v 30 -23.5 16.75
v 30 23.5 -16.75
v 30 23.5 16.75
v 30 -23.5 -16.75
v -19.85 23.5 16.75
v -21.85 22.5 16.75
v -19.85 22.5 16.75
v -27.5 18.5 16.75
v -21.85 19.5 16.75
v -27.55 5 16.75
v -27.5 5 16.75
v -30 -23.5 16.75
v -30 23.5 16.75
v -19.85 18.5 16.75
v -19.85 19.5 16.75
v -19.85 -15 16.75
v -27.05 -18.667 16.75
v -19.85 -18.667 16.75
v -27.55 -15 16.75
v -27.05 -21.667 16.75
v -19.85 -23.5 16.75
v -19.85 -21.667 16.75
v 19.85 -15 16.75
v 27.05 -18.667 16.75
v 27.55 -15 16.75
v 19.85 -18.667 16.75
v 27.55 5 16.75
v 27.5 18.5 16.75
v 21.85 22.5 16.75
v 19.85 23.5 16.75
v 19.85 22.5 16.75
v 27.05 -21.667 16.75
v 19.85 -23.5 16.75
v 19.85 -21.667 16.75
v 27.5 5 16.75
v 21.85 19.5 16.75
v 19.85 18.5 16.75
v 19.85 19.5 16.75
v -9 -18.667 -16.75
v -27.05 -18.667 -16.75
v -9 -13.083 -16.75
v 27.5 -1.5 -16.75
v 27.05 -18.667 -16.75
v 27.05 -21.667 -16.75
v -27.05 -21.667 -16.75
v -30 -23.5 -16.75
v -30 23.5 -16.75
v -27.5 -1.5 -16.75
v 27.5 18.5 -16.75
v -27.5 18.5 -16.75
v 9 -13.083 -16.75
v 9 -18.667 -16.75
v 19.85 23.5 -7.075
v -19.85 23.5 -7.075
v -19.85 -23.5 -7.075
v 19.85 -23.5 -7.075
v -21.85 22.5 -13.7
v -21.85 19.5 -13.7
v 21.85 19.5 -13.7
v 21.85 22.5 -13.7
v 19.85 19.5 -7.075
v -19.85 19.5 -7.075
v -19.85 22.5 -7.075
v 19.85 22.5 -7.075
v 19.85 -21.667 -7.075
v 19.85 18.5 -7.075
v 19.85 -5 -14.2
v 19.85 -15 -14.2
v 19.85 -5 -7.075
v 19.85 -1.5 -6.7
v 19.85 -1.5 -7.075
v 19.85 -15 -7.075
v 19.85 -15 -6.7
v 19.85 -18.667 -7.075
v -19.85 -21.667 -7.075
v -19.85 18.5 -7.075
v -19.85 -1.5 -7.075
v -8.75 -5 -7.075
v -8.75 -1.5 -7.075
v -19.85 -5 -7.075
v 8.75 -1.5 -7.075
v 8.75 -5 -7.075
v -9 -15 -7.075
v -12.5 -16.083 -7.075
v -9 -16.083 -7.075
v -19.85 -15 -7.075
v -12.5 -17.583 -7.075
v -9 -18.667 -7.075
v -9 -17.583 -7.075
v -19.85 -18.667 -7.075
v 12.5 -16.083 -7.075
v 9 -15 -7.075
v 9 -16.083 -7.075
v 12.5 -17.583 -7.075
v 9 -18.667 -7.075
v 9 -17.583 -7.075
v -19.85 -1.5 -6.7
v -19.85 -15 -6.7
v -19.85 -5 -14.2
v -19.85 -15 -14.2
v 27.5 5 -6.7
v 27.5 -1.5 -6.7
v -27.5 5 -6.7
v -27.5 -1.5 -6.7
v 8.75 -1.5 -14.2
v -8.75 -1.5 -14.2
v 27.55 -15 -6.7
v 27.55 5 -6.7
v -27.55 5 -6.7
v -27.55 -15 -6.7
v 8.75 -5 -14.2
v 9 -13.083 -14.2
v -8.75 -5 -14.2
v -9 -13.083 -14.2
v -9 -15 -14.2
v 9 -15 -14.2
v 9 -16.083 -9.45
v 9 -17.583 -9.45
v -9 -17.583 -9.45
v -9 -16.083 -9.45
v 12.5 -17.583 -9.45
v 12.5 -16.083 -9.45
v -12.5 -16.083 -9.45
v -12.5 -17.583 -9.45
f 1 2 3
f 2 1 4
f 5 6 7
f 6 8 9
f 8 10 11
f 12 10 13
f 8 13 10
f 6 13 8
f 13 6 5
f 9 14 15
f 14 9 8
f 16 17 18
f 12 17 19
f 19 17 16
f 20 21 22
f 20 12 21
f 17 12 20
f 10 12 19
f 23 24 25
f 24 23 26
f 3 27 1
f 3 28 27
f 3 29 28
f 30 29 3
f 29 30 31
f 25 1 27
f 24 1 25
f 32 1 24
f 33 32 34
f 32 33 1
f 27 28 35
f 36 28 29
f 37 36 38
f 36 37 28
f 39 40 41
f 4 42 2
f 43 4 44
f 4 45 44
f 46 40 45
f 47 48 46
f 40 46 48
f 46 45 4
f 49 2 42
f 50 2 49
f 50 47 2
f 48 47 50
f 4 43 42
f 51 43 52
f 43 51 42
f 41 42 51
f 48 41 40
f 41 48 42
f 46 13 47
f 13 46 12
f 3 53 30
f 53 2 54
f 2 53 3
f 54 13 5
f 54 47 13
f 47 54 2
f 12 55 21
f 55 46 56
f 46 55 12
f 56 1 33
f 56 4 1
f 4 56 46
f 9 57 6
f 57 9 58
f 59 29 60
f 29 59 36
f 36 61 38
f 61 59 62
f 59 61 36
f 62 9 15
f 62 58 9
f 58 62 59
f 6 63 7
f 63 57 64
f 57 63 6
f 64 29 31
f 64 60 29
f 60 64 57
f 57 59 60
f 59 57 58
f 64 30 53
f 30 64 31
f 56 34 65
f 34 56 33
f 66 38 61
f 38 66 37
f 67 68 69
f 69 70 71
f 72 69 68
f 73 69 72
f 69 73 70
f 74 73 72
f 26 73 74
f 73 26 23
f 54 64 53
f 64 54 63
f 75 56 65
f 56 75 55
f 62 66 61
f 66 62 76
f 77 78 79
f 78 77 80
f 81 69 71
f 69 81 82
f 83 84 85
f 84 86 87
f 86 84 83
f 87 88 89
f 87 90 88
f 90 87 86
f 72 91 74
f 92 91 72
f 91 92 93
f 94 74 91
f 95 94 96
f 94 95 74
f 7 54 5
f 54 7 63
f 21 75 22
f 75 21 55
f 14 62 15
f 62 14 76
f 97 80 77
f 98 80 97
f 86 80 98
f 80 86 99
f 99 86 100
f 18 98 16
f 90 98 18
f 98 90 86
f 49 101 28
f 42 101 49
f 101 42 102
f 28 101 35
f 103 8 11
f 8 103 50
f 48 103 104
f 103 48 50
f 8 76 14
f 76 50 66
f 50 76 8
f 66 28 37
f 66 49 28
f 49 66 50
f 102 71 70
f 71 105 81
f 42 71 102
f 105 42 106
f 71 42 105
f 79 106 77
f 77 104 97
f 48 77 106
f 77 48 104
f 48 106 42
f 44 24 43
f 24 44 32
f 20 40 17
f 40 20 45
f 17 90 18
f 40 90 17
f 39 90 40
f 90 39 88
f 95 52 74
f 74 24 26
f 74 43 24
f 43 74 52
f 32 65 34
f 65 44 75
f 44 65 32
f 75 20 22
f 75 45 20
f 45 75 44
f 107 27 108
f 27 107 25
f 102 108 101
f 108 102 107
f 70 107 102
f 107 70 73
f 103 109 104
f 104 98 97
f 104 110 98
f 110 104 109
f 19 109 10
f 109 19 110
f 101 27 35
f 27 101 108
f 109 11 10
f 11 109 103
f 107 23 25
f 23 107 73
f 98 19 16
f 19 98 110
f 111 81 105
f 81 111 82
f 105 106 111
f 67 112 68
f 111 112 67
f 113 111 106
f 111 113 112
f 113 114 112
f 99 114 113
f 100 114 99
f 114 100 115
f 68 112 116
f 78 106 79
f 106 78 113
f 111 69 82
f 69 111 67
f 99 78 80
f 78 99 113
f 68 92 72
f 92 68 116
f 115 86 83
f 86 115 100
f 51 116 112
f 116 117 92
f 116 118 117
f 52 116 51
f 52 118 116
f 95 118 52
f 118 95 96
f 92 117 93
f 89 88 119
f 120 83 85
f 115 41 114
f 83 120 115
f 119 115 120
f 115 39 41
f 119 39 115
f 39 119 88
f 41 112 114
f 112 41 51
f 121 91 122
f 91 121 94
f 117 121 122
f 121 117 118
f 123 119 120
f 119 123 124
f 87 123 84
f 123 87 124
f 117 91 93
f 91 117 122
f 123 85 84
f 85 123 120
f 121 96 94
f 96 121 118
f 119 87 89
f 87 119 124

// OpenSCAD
/*
    Fernán Federici 2017 (CC BY 4.0; https://creativecommons.org/licenses/by/4.0/) 
 
    With this code you can make a camera adapter for RPI camera from waveshare (http://www.waveshare.com/product/mini-pc/raspberry-pi/cameras/rpi-camera-b.htm) and for V2 RPI camera (https://www.raspberrypi.org/products/camera-module-v2/)
 
*/

/////This code needs a lot of clean up and reorganization but it works//////////edits would be very welcome :) ////////////
 
x=60;//frontal width
y=47;//height 33+9+5
z=33.5; // depth
filter_x=43.7;
filter_y=31.4;
filter_z=3;
bed_x=54;
bed_y=3;
bed_z=100;
arm=5;
focus_space=20; // enough distance for lens focus adjustment
holder_x=54;//acrylic bed width to fit into holder
holder_y=3;//acrylic bed thickness to fit into holder, normally 3mm acrylic
$fn=100;
fudge=0.1; // to fix error in rendering leaving thin wall...help me!
int_gap=17.5; 
camera_type=0; //0 for waveshare camera (32x32mm); 1 for V2 RPI camera (25x24x9)
china_spacex= 24.3;
V2_spacex= 18;
waveshare_cam_x=32.2;
waveshare_cam_y=1.5; //thickness
waveshare_cam_z=32.2;
RPIV2_cam_x=25;
RPIV2_cam_y=1.5; //thickness
RPIV2_cam_z=24;


module cam_holder_base() {
    difference(){
    cube([x,y,z], center=true);
           translate([0,(y/2)-arm/2,2]) rotate([90,0,0])  cube([filter_x,filter_y,filter_z], center=true);
           translate([0,0,8])  color("blue") cube([filter_x-4,y+fudge,z*0.9], center=true);
           translate([0,(y/2)-(focus_space/2+arm),0])  color("Red")  cube([(x-arm),focus_space,z+fudge], center=true);
           translate([0,-((y/2)-arm/1.5),0]) color ("pink") cube([holder_x+fudge,holder_y,z+fudge], center=true);
           translate([0,-arm,arm+fudge]) color ("purple")  cube([(x-arm)+fudge,focus_space,(z-arm*2)+fudge], center=true);
           translate([0,-arm*1.5,-arm/2+fudge]) color ("yellow")  cube([int_gap,y/2,(z-arm*2)+fudge], center=true);
           translate([0,-arm*2,-arm/2+fudge]) color ("black")  cube([filter_x-4,arm*2,(z-arm*2)+fudge], center=true);
    }
}
       
module waveshare_cam() {
           translate([0,-((y/2)-arm/.75),0]) color ("red")  cube([china_spacex,arm*1.5,z+fudge], center=true);
           translate([0,-((y/2)-arm/.75),arm/2+fudge]) color ("yellow")  cube([waveshare_cam_x,waveshare_cam_y,z+fudge], center=true);
 }
  
module RPIV2_cam() {
       //difference() {
           //cam_holder_base();
           translate([0,-((y/2)-arm/.75),0]) color ("red")  cube([V2_spacex,arm*1.5,z+fudge], center=true);
           translate([0,-((y/2)-arm/.75),arm/2+fudge]) color ("yellow")  cube([RPIV2_cam_x,RPIV2_cam_y,RPIV2_cam_z+fudge], center=true);
     }     
     
module cam_holder(camera_type) {

     if(camera_type==0)
           difference() {
           cam_holder_base();
               waveshare_cam() ;
           }          
     else 
           difference() {
           cam_holder_base();
               RPIV2_cam();
           }
       }     
cam_holder(1); 
